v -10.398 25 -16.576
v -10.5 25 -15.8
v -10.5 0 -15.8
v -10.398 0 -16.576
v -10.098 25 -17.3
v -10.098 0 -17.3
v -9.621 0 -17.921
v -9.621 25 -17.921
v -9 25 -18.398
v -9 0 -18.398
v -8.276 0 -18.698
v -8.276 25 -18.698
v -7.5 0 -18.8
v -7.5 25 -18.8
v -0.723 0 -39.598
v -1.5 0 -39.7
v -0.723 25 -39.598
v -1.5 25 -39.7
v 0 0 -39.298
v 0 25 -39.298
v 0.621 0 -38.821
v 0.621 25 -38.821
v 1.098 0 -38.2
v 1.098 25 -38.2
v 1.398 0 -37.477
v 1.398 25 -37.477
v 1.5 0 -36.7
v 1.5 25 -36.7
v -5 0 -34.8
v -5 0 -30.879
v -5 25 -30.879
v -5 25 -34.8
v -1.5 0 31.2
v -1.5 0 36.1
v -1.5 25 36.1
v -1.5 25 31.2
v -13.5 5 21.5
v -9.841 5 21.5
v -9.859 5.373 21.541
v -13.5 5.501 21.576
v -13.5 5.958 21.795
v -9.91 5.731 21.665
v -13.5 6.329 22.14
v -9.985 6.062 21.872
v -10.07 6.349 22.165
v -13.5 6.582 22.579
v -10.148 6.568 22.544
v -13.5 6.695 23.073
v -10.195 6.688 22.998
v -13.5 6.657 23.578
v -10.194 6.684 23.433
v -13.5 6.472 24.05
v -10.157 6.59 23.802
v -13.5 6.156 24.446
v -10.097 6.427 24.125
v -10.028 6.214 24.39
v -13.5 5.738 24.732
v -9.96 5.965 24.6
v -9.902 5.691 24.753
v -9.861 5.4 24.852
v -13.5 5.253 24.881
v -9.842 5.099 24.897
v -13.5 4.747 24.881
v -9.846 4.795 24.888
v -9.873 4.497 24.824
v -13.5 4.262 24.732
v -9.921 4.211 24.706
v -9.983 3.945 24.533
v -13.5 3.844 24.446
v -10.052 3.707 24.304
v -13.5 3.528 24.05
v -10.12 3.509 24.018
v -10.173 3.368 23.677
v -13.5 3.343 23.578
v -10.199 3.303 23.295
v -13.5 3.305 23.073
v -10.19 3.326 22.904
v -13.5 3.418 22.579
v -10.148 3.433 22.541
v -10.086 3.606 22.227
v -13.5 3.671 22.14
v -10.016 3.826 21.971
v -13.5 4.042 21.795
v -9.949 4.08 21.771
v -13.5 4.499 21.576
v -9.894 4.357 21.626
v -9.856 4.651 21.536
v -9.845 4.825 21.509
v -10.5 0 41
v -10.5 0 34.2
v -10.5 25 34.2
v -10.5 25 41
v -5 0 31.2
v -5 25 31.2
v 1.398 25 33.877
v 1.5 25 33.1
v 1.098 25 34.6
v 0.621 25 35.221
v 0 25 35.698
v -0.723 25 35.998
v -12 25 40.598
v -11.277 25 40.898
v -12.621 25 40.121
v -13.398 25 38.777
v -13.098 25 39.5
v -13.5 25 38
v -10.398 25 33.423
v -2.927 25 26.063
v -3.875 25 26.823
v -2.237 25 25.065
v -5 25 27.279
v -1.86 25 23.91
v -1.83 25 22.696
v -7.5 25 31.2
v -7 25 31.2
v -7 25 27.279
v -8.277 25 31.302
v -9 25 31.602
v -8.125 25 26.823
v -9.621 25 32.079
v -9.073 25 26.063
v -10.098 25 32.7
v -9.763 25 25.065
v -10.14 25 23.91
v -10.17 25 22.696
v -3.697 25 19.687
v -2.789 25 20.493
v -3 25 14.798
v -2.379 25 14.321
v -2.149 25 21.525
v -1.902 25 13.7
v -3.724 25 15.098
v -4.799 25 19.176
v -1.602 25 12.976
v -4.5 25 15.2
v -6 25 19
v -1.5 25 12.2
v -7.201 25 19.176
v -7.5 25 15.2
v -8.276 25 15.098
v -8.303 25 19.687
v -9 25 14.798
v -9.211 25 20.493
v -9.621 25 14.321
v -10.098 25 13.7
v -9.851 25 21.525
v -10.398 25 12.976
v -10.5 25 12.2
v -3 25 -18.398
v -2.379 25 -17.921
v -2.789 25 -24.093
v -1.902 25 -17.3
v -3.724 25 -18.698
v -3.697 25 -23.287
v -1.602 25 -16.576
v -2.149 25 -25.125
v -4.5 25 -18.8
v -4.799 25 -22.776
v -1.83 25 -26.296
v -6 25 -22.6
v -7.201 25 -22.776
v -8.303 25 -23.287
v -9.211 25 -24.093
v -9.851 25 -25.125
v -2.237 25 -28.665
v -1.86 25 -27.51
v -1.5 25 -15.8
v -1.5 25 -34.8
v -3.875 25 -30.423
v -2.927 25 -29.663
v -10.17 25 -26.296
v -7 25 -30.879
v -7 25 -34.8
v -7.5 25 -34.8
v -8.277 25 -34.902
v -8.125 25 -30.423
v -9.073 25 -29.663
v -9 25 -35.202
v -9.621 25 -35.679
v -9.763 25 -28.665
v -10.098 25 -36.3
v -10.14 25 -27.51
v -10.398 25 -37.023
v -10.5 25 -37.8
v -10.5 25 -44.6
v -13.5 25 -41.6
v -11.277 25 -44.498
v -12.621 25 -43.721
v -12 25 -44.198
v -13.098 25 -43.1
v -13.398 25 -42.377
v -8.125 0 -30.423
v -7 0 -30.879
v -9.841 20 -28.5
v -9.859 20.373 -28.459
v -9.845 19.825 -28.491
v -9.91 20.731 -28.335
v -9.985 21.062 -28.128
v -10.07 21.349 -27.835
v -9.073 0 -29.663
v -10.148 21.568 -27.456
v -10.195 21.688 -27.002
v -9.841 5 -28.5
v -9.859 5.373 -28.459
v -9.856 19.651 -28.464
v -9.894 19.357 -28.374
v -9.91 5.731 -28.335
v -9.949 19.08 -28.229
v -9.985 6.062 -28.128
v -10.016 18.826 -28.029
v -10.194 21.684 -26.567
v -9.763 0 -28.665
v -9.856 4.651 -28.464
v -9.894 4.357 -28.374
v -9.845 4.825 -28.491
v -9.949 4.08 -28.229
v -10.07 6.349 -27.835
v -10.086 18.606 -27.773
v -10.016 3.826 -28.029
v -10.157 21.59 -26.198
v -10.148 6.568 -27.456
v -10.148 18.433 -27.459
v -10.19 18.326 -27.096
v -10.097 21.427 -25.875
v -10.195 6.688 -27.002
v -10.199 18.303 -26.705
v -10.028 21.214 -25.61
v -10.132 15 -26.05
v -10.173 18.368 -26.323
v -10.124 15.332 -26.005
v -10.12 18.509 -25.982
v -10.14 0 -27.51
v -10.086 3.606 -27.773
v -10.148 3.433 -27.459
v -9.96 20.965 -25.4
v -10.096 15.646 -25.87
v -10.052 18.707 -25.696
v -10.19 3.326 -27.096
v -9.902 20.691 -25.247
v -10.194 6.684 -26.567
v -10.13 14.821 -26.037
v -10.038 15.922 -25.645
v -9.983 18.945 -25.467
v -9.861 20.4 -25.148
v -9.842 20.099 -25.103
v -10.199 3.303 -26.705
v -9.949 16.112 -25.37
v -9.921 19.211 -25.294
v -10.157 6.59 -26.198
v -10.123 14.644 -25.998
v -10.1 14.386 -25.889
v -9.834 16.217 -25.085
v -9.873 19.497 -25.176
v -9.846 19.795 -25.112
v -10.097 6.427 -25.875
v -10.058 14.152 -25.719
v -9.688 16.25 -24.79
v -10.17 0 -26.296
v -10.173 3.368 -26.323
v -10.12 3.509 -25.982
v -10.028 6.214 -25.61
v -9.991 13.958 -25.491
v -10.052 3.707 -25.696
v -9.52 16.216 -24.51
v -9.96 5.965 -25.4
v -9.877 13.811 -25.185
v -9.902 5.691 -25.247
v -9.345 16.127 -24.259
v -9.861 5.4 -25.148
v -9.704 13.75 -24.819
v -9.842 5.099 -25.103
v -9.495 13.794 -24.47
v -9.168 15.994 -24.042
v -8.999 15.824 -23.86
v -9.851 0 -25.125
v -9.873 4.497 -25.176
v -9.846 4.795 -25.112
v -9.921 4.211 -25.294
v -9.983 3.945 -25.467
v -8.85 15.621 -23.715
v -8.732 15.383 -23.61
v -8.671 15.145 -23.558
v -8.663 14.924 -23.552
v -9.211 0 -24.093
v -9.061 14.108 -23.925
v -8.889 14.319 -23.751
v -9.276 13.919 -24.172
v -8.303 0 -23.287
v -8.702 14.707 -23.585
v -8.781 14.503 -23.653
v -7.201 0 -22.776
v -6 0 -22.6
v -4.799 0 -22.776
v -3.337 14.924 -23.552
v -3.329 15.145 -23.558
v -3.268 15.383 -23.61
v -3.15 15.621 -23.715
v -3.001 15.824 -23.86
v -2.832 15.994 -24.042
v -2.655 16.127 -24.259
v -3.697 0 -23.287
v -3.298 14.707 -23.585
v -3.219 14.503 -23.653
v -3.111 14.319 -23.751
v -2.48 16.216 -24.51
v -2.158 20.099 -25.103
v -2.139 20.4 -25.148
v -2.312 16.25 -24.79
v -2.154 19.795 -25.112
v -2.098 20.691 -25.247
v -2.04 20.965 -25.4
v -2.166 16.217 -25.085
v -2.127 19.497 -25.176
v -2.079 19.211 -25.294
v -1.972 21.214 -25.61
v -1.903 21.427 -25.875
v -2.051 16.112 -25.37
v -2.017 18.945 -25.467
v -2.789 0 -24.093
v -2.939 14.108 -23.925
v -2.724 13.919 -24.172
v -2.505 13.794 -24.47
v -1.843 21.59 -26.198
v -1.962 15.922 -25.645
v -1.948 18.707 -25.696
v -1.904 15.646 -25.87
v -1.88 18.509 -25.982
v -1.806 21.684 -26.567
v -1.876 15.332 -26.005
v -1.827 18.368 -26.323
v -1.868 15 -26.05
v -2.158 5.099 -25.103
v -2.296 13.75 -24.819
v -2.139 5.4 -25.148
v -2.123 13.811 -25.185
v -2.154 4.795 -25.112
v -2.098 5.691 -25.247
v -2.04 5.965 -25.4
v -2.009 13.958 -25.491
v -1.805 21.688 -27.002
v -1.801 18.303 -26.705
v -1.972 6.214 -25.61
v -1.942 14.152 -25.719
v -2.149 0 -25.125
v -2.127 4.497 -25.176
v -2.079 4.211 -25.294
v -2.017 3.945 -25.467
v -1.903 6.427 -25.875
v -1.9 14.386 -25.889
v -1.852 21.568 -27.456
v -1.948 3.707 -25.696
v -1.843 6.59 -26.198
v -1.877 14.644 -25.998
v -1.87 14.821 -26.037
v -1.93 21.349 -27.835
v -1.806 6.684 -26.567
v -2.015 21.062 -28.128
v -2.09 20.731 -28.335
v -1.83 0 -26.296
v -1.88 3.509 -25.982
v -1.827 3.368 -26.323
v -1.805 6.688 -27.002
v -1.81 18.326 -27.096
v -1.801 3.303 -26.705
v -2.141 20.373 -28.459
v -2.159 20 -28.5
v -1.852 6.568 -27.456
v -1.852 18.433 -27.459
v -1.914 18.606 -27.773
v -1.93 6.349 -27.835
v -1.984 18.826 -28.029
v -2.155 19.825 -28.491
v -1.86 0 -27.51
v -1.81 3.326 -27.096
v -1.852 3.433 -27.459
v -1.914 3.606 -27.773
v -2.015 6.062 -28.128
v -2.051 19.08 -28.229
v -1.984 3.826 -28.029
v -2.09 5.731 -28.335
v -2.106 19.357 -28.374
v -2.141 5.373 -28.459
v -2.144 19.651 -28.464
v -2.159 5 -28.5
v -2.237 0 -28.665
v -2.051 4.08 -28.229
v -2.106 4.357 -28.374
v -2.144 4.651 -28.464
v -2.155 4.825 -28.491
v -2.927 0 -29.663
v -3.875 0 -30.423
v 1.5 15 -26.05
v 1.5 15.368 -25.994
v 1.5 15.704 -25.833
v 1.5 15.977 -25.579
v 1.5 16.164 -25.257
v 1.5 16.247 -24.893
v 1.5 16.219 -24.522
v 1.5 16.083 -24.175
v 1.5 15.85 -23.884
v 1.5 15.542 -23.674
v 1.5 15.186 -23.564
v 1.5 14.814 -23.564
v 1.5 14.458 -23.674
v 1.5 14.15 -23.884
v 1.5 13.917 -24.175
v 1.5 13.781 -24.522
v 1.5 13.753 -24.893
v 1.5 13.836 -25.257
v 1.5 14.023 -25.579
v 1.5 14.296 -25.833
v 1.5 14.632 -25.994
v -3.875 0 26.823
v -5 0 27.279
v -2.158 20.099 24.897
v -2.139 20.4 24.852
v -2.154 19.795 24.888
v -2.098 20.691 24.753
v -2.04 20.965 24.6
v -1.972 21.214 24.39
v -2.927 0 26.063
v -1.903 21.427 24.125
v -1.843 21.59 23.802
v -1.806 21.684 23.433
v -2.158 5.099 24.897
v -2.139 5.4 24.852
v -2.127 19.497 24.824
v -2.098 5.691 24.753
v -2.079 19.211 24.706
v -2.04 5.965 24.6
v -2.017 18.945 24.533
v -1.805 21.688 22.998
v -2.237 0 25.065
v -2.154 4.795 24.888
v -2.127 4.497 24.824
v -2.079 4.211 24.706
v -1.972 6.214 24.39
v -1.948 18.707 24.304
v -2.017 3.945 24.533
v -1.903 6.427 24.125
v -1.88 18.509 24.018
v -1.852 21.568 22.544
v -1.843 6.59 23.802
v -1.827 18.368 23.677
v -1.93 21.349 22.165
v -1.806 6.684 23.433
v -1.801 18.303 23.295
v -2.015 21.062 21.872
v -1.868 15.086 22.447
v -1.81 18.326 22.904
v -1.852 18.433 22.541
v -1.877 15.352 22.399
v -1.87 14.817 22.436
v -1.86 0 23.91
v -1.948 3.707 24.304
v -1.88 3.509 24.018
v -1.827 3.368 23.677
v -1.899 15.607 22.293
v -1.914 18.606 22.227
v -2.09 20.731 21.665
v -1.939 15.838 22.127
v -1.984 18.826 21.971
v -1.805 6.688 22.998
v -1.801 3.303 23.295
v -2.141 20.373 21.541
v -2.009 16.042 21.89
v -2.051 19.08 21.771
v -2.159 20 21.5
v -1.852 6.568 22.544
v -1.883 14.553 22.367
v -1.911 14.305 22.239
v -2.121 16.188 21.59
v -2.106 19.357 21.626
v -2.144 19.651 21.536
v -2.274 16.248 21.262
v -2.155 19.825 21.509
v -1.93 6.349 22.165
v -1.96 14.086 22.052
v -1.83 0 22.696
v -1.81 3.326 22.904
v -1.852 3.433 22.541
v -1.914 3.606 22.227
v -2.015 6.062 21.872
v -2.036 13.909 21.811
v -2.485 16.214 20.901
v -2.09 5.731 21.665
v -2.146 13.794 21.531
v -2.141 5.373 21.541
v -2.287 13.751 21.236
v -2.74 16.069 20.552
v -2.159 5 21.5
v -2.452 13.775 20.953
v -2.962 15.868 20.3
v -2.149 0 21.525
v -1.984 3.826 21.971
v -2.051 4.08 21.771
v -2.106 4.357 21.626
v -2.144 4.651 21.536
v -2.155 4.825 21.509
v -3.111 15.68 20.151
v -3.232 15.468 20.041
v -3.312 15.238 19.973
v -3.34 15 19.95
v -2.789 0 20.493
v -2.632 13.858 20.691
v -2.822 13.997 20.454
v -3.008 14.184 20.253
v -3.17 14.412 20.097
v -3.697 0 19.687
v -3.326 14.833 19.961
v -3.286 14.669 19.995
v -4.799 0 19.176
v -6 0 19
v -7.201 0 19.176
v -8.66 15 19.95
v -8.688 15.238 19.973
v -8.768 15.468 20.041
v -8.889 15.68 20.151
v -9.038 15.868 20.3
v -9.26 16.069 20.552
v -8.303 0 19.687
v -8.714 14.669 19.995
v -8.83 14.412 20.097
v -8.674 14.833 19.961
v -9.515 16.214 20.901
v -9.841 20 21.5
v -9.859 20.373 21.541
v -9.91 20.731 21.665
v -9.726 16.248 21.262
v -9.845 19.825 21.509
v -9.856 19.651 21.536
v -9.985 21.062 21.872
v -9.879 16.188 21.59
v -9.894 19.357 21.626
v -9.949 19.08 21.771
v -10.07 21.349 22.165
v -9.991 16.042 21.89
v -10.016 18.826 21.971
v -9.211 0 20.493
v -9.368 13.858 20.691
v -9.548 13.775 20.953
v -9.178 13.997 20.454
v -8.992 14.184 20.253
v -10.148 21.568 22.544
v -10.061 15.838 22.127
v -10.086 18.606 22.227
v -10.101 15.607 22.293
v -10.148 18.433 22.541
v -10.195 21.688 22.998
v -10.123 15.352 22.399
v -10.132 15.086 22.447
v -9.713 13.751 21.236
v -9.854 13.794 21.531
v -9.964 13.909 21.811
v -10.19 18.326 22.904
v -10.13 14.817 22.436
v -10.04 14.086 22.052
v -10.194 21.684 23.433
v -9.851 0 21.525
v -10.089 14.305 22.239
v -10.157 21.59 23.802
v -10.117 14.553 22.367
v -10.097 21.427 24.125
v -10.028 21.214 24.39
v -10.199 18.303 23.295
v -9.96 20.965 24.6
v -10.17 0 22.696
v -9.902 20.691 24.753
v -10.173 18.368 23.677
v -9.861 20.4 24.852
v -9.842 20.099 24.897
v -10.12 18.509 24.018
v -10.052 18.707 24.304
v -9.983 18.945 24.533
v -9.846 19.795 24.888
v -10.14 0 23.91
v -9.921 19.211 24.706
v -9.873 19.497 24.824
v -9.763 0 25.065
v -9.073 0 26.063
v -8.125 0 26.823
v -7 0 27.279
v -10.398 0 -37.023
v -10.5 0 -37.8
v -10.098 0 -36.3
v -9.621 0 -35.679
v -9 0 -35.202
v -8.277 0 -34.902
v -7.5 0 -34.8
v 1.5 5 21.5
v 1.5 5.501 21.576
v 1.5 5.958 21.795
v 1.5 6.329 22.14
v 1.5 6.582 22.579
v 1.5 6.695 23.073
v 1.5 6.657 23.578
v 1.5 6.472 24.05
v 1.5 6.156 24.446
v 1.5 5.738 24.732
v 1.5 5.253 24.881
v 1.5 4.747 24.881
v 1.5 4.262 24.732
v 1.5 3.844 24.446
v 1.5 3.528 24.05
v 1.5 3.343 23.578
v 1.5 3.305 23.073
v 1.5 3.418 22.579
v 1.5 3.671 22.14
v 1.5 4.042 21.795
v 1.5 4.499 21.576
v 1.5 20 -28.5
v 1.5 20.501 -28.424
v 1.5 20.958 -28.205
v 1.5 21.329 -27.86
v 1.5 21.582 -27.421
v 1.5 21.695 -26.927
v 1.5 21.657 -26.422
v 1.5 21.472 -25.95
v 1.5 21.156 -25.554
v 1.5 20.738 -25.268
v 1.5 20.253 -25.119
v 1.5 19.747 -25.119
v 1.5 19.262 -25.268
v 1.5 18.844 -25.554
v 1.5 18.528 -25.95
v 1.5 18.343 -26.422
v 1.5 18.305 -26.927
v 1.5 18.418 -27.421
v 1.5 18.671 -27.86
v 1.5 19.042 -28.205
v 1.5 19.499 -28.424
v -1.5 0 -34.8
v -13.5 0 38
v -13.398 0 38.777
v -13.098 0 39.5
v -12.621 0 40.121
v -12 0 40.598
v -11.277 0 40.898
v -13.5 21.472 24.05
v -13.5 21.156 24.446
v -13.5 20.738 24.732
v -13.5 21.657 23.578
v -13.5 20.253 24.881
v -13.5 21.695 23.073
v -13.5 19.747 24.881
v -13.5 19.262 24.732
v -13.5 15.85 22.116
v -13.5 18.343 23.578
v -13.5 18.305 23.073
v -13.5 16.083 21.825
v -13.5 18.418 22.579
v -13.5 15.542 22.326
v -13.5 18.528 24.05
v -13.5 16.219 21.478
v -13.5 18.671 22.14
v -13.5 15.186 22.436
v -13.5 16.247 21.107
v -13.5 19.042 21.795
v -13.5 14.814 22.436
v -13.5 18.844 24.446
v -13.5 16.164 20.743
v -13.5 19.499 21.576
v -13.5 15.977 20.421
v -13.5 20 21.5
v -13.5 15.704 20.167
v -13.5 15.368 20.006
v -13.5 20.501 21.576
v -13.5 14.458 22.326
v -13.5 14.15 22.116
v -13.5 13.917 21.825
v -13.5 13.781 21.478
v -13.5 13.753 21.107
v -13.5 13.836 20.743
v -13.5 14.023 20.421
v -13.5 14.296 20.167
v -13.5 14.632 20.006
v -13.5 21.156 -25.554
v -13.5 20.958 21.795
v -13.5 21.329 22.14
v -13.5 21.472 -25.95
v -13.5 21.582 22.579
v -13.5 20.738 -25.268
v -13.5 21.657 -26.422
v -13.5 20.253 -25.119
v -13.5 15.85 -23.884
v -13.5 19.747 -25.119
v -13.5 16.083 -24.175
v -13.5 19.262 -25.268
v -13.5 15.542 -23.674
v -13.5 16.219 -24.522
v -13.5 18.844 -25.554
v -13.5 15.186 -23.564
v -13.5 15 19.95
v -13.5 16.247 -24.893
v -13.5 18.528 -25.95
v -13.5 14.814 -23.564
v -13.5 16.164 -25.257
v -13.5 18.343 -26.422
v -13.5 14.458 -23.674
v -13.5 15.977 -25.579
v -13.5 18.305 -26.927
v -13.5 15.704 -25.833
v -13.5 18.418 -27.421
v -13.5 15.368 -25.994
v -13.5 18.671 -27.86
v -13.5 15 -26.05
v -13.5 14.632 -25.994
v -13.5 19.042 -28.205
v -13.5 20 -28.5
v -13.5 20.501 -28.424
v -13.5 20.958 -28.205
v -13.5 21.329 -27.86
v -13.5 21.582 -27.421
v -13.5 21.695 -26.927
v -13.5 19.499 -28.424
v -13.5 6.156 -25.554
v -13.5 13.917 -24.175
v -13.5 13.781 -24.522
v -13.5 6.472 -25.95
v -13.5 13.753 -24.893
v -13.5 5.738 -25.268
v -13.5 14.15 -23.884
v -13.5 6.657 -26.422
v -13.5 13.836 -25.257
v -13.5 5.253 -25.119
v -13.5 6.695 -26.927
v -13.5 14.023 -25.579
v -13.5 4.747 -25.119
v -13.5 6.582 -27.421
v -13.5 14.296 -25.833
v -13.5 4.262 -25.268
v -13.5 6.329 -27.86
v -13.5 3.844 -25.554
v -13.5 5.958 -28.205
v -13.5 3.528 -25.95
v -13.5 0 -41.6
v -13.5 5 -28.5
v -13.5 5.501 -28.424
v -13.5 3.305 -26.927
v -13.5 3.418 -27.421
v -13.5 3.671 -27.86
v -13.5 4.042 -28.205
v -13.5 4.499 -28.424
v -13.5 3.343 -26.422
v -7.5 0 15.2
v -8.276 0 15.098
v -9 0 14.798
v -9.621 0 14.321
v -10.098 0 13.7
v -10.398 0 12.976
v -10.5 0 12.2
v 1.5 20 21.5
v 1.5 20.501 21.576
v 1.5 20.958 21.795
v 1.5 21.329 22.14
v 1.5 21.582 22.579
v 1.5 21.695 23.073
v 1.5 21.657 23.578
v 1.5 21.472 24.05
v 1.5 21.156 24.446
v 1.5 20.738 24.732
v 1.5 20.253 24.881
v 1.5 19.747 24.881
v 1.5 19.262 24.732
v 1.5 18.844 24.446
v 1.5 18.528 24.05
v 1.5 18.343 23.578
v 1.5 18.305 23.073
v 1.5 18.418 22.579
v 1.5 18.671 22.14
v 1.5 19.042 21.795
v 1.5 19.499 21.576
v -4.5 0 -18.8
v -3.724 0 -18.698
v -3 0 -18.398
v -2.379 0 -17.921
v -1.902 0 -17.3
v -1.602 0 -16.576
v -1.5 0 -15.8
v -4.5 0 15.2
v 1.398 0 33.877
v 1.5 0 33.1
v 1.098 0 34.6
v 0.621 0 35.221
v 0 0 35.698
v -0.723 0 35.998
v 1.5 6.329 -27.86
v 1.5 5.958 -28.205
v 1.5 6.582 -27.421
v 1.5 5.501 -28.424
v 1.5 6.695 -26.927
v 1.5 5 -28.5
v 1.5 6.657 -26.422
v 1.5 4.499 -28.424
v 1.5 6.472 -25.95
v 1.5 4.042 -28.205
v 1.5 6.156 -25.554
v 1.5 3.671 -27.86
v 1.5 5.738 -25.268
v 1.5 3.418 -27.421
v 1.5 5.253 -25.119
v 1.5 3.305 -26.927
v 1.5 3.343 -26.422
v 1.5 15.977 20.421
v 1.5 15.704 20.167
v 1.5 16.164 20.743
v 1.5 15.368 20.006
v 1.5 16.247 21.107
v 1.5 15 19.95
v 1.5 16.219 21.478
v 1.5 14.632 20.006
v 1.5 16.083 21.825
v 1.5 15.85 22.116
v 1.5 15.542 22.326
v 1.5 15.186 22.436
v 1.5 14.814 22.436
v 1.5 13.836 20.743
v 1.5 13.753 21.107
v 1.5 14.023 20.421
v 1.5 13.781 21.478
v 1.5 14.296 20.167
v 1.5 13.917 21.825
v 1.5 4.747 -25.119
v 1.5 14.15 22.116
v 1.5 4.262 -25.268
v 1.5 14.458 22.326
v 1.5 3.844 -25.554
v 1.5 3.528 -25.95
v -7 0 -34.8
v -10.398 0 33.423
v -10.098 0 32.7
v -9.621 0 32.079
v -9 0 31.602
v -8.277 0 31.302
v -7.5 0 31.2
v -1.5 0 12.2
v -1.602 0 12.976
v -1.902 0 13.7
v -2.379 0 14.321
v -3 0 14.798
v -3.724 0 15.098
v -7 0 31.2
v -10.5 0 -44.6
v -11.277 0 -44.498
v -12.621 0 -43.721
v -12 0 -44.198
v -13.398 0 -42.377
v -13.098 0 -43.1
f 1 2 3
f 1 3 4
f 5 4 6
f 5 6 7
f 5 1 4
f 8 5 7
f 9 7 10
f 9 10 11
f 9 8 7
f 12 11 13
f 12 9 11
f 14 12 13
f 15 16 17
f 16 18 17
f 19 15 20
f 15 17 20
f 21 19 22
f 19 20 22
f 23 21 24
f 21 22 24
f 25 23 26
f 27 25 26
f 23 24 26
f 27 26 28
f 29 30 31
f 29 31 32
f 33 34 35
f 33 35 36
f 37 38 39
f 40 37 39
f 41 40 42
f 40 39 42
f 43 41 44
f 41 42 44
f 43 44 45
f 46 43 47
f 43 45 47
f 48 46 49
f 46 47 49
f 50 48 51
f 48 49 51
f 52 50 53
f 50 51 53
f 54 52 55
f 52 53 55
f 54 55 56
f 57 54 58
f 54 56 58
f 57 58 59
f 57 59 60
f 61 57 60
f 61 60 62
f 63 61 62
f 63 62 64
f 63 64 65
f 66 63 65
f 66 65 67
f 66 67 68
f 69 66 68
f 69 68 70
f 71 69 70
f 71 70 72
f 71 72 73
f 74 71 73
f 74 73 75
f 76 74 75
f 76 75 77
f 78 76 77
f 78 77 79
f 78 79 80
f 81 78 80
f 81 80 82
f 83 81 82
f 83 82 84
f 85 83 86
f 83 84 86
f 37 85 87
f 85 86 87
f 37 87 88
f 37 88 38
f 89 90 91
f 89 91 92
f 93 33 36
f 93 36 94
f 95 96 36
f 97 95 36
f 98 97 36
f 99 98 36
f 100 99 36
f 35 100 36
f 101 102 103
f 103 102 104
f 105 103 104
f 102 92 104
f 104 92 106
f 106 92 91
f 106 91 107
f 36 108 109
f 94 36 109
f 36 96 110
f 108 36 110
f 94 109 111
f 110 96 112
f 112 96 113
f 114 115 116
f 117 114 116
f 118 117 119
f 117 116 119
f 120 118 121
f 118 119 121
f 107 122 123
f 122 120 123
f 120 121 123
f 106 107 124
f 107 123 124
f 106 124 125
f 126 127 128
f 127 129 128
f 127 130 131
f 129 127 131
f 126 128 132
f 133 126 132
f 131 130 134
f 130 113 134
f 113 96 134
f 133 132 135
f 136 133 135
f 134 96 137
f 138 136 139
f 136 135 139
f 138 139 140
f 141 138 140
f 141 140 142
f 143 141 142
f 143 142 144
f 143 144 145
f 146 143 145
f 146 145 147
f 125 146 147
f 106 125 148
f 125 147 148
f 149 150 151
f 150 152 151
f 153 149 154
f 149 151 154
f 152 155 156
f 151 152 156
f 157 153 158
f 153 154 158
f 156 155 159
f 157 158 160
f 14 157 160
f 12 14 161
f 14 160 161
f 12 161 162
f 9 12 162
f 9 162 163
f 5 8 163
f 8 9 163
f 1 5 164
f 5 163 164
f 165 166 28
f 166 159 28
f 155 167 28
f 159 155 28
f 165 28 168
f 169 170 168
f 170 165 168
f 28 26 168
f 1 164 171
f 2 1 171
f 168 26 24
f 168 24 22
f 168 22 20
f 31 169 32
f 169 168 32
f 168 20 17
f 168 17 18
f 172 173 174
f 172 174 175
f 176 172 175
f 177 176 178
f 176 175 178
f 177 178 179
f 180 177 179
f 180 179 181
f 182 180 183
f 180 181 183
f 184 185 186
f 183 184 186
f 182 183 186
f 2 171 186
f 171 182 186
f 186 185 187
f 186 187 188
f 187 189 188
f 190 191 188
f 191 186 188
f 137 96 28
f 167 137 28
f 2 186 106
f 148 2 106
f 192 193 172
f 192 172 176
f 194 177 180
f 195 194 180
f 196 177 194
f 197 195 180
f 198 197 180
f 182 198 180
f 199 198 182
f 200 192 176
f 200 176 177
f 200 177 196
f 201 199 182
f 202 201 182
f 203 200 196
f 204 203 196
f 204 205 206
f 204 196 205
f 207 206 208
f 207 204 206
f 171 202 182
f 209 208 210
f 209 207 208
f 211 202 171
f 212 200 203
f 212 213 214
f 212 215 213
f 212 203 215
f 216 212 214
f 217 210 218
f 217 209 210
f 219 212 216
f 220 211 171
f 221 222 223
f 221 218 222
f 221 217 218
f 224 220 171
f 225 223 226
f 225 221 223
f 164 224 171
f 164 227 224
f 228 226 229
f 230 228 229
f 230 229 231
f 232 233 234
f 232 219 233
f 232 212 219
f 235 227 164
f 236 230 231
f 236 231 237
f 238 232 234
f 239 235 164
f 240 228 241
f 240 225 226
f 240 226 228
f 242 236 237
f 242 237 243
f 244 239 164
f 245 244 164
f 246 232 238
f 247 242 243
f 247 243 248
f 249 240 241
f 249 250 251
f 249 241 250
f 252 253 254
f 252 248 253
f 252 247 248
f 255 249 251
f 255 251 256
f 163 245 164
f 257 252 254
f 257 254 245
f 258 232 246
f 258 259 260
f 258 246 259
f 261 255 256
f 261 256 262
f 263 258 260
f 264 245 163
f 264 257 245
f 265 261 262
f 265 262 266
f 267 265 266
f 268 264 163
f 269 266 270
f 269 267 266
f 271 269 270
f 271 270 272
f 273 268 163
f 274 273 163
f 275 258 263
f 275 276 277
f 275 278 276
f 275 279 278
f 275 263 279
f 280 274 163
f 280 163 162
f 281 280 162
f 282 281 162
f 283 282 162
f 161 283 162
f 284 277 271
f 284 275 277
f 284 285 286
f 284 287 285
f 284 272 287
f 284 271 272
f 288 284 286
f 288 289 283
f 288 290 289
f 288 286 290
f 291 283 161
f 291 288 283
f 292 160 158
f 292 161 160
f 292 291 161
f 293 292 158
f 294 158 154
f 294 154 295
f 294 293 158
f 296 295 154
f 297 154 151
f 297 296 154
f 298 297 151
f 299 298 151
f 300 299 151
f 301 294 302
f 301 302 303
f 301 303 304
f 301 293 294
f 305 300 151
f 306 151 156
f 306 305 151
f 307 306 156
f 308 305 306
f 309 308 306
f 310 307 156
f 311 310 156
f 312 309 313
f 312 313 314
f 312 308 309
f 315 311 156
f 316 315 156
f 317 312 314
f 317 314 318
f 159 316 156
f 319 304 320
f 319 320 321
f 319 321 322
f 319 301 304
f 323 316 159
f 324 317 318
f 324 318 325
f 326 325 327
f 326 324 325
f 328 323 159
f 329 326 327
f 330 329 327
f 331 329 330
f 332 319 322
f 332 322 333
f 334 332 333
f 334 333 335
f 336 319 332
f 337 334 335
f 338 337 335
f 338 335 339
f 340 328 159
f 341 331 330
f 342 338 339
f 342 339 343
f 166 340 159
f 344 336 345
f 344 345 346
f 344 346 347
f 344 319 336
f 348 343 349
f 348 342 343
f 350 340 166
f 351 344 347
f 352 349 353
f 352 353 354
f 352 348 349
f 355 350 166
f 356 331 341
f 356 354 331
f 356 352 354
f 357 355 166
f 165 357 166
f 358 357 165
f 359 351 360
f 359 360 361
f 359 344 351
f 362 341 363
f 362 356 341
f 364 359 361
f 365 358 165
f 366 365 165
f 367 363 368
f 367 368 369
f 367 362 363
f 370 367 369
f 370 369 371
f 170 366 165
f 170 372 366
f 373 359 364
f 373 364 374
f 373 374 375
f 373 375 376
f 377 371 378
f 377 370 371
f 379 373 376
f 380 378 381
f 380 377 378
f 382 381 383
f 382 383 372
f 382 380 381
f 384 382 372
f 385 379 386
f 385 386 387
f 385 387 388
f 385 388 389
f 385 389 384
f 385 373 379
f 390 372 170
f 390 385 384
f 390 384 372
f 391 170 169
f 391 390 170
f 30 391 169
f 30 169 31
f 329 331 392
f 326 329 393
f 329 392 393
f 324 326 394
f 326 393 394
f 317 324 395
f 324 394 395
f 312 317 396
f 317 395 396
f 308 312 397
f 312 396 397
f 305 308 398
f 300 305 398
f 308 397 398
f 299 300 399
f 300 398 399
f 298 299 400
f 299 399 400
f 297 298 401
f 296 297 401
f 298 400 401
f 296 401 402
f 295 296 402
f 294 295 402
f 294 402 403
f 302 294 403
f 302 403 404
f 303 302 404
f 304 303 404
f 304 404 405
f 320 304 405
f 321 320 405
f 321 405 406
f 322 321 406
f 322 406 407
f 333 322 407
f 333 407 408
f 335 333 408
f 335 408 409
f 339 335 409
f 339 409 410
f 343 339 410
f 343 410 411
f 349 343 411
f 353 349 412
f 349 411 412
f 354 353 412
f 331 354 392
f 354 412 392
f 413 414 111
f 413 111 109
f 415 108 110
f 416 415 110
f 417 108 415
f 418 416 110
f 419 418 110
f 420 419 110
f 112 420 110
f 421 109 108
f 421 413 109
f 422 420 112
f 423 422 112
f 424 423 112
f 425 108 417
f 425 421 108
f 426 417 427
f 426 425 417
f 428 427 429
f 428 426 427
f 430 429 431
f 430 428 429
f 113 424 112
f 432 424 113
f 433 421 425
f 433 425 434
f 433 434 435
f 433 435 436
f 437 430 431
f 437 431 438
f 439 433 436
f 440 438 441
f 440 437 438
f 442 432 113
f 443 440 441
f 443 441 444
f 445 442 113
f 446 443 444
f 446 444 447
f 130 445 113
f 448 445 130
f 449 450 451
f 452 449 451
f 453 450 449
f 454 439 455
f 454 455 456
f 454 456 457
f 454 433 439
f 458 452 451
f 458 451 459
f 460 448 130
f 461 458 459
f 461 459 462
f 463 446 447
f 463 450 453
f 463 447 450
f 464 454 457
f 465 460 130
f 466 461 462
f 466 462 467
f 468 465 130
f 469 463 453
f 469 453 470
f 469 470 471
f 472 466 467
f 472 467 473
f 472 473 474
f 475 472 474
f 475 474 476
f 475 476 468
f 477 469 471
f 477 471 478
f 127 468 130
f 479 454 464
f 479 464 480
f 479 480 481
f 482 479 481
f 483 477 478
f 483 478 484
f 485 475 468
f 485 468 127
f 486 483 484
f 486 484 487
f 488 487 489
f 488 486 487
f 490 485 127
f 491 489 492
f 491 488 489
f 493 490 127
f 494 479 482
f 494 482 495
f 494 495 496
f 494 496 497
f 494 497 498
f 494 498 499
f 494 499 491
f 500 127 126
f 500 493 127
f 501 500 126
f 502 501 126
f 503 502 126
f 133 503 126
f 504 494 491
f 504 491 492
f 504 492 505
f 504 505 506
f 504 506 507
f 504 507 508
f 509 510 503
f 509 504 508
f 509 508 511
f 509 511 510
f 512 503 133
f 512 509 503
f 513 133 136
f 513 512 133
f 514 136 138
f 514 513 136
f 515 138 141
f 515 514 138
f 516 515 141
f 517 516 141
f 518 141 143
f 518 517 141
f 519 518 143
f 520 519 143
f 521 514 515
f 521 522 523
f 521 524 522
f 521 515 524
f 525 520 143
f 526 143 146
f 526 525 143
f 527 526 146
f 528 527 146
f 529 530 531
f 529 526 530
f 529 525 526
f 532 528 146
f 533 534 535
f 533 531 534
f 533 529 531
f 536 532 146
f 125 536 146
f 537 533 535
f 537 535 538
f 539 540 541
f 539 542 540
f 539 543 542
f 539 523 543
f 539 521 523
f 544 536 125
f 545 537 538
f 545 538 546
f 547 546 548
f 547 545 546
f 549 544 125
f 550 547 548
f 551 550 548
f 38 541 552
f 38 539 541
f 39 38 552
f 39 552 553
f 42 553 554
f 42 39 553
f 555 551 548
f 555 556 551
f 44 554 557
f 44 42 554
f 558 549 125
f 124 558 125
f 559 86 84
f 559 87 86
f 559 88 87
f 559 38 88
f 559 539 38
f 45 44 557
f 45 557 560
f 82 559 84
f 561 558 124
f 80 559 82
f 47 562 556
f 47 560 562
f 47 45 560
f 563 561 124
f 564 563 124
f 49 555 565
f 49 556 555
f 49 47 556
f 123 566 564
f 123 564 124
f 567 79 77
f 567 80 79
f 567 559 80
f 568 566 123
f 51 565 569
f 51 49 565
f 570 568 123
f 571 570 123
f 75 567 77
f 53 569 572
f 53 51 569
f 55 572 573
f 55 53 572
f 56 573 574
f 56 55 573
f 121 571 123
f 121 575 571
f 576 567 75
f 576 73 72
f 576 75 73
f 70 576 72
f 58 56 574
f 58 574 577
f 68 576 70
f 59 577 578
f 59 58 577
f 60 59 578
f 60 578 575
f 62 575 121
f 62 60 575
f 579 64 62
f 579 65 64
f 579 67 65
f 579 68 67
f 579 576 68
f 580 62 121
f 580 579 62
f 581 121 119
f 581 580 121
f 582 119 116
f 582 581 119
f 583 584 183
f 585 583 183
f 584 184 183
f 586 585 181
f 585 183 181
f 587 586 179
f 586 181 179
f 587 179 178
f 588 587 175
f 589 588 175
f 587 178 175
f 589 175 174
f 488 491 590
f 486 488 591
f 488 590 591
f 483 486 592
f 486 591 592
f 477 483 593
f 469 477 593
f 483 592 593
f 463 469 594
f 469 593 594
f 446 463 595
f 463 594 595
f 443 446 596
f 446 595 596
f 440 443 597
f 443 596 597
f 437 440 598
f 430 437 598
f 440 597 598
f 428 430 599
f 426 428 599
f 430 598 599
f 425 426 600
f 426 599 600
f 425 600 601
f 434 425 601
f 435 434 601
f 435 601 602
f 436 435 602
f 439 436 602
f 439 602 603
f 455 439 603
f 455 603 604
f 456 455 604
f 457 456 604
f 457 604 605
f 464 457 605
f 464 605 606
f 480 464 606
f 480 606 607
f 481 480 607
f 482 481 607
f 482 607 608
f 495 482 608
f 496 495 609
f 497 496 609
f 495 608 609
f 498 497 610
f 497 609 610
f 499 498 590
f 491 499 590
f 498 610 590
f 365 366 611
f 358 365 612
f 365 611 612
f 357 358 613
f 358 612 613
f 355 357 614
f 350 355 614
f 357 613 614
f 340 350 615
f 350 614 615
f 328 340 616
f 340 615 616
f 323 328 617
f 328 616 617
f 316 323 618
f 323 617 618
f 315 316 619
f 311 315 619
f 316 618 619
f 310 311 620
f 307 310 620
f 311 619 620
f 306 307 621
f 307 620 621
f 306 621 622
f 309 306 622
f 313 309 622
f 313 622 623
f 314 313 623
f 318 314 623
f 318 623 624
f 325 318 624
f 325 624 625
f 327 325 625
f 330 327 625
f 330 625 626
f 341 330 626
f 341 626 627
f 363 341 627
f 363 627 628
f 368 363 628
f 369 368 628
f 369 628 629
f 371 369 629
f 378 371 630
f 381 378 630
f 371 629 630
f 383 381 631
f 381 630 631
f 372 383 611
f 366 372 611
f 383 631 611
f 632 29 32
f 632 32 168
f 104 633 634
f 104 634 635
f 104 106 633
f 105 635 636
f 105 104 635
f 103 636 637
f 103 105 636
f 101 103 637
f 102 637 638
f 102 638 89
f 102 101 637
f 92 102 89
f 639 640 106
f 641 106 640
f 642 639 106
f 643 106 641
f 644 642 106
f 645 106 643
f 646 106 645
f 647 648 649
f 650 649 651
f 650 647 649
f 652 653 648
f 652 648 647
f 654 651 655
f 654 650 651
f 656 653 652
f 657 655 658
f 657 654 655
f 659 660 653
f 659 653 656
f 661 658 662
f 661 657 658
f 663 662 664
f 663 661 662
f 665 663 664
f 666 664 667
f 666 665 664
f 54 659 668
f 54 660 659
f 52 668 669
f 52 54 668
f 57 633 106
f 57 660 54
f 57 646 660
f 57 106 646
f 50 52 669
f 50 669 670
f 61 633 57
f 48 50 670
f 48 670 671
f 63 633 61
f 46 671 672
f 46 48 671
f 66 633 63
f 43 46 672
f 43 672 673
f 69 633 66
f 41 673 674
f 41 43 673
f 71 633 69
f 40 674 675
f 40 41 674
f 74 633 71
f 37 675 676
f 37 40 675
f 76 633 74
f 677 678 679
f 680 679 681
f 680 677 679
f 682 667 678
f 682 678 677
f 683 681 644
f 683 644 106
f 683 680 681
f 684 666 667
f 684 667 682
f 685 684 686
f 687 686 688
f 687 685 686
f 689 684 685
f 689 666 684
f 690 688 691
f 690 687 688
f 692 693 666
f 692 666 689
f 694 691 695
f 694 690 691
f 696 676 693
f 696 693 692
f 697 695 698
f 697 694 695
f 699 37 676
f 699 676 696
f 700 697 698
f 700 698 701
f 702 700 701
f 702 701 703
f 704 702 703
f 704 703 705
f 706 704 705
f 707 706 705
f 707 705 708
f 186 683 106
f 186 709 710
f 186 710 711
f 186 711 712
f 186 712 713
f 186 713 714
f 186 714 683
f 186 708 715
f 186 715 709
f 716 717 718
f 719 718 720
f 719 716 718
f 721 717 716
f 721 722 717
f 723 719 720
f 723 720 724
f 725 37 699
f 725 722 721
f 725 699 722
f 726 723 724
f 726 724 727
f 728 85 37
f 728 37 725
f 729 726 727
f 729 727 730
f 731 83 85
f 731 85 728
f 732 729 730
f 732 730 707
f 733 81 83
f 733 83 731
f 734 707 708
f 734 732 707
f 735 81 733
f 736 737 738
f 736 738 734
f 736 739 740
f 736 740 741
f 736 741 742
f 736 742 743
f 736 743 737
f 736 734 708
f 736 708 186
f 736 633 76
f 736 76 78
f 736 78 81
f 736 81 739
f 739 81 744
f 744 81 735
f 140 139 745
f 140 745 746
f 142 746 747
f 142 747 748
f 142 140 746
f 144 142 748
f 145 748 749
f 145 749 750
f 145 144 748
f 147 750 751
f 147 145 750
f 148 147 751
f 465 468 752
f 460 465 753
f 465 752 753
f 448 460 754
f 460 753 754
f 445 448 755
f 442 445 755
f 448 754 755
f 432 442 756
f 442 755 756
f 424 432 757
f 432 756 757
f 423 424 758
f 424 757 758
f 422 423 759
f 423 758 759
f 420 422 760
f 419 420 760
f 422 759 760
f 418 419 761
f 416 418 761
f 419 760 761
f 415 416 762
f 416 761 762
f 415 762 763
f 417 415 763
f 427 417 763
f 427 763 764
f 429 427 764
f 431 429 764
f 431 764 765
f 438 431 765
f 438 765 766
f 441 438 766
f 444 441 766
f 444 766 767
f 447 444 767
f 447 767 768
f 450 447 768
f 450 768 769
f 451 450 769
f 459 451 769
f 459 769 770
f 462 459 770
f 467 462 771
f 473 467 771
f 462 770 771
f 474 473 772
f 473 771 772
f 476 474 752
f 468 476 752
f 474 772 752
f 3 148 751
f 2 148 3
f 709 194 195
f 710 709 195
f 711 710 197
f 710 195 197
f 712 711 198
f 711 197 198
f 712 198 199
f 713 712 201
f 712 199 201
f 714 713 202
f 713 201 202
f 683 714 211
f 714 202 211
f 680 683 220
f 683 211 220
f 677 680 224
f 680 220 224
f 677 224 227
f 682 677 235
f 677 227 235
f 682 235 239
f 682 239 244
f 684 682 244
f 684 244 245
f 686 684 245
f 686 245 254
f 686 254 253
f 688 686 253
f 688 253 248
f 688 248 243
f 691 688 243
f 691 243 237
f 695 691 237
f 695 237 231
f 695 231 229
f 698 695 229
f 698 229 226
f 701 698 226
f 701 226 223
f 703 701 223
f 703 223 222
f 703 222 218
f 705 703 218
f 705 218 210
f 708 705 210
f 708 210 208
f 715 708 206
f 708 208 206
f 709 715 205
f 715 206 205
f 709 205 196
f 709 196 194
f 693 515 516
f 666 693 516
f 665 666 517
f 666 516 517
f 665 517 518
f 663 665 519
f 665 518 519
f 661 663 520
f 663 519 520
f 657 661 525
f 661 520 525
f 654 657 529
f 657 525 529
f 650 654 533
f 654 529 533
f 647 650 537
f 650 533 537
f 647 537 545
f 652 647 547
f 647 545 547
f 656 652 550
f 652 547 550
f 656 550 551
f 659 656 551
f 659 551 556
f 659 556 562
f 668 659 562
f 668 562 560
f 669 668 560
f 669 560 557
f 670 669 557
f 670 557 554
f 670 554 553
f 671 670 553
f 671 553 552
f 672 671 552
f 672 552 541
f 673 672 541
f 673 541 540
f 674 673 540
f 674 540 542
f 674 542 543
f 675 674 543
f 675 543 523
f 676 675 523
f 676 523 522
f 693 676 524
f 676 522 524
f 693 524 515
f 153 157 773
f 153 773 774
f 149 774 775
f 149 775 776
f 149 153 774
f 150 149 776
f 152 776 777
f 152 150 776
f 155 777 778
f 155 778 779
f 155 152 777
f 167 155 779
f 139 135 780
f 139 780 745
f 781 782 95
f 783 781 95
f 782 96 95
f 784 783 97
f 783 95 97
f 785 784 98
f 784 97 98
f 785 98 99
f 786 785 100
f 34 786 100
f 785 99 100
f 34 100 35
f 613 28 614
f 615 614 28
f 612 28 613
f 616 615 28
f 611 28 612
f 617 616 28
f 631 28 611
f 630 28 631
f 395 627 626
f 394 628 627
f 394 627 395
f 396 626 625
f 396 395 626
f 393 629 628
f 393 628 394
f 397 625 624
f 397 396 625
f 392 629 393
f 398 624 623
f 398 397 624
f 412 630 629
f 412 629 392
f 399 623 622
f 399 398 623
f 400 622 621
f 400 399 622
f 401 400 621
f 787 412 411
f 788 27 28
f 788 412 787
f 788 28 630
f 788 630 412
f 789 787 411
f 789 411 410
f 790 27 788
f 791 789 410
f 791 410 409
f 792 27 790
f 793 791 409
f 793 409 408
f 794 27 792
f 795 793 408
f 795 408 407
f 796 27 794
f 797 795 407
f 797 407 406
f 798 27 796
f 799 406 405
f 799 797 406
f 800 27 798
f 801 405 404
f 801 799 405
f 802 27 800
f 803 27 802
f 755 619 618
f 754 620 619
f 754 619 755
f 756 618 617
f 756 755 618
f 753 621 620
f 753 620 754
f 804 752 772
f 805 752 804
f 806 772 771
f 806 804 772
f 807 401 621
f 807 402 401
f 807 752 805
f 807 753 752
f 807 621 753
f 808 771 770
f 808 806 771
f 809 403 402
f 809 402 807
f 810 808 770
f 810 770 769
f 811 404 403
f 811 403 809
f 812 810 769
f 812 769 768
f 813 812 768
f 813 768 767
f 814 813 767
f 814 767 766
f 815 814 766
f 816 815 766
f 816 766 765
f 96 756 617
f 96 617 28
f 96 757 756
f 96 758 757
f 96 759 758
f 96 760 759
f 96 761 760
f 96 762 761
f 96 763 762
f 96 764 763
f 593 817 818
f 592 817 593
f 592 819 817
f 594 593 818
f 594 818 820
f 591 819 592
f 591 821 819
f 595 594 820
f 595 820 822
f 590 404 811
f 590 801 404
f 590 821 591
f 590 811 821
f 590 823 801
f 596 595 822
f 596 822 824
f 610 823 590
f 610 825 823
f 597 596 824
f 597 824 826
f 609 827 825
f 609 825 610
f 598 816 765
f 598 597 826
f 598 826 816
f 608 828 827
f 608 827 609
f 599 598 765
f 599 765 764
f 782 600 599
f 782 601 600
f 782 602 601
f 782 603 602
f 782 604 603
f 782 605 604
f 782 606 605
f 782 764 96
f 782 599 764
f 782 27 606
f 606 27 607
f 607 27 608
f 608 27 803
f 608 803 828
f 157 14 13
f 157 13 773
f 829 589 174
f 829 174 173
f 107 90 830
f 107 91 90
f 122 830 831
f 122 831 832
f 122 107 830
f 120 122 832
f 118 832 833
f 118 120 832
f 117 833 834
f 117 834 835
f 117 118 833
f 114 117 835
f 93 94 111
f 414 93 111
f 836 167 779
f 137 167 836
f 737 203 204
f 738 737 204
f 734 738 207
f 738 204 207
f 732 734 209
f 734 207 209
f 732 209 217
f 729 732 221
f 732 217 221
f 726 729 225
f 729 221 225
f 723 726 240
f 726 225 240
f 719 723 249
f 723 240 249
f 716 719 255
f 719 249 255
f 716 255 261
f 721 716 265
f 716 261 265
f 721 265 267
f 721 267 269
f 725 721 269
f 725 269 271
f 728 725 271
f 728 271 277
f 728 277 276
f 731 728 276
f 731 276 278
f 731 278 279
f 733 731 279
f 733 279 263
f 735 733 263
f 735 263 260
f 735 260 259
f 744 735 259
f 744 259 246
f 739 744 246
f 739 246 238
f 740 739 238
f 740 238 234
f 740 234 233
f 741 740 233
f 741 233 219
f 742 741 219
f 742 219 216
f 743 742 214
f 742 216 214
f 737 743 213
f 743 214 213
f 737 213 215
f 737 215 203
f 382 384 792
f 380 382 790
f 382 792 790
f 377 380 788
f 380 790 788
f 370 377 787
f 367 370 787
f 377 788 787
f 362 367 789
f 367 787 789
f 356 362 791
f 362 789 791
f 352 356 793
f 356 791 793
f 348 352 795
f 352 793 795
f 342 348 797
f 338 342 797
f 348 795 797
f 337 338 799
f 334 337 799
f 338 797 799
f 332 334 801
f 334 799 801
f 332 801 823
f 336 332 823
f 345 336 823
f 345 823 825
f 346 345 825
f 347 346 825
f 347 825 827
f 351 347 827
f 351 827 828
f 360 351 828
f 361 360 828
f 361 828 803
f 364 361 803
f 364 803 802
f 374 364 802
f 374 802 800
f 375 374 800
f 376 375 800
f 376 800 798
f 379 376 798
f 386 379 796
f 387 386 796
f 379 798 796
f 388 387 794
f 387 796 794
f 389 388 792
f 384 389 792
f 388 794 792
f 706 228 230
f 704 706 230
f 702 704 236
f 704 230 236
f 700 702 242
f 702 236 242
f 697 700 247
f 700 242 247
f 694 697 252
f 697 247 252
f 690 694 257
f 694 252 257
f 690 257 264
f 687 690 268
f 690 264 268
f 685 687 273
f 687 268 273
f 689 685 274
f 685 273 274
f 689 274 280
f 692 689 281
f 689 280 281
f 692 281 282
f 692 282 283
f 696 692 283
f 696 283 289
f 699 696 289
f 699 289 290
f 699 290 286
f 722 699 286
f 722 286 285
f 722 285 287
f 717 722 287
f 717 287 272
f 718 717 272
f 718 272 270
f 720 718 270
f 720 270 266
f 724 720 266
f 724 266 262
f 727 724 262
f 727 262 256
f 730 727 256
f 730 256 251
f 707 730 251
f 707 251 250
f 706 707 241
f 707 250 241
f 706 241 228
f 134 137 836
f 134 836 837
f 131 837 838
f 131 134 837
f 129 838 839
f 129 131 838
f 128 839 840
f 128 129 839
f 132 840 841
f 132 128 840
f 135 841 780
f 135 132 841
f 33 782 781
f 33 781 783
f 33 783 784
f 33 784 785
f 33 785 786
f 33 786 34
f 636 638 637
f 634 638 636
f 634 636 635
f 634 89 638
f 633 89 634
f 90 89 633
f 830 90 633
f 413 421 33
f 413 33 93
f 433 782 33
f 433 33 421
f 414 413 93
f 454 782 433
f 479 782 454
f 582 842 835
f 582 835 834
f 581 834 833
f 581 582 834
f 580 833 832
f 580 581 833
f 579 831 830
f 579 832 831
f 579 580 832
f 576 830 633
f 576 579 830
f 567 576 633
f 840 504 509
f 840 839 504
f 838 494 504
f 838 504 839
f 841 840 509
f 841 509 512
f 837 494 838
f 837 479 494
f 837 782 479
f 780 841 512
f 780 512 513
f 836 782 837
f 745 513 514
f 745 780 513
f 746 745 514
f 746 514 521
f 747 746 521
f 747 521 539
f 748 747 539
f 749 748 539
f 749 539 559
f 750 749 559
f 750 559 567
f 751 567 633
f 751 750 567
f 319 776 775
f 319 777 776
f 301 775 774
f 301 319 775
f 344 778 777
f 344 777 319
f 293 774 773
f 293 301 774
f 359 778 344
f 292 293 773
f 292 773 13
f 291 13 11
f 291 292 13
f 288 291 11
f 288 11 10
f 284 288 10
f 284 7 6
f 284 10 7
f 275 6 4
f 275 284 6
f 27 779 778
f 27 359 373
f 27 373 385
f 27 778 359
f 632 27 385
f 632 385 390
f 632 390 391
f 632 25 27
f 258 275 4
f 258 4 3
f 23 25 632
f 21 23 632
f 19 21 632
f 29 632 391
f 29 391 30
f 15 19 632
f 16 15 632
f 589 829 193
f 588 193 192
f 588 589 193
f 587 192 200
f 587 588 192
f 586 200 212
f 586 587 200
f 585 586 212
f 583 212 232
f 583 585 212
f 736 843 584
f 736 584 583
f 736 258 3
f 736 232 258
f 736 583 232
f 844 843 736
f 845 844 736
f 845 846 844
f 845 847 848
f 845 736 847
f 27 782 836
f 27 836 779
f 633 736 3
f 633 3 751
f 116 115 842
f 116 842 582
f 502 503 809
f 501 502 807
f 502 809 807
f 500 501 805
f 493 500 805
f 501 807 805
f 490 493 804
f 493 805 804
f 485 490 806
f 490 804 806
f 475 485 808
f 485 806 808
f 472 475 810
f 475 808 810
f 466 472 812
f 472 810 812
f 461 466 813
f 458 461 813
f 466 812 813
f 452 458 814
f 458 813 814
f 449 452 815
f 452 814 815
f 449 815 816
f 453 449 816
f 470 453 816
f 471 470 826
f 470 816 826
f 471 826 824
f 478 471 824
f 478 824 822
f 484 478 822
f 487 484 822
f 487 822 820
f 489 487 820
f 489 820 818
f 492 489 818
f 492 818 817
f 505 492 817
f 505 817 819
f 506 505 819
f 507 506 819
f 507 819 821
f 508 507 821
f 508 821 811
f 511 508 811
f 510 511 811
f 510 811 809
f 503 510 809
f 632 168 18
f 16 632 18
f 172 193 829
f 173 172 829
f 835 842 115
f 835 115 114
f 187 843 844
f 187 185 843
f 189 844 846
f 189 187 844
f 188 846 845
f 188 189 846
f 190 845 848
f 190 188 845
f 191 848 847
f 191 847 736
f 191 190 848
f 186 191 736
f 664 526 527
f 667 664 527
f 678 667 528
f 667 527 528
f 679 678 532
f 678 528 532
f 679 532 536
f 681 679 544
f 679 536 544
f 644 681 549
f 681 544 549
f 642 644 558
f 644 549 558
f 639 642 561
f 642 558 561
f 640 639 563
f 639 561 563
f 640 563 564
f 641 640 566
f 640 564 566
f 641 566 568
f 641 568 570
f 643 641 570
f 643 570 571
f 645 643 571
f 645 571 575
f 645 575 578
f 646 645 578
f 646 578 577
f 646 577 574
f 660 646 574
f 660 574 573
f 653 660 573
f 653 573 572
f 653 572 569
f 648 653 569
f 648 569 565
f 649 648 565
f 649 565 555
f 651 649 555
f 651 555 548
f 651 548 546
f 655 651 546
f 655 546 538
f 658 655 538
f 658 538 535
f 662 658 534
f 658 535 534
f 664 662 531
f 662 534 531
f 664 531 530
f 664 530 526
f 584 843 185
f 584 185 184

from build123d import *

# Parameters (mm, degrees)
SKETCH_2_R          = 4.2
EXTRUDE_1_DEPTH     = 25
FILLET_1_R          = 3
CUT_EXTRUDE_1_DEPTH = 25
SKETCH_4_W          = 2
SKETCH_4_H          = 9.772408651
SKETCH_4_H_2        = 10.02993421
CUT_EXTRUDE_2_DEPTH = 25
SKETCH_5_R          = 1.25
CUT_EXTRUDE_3_DEPTH = 35
SKETCH_6_R          = 1.7
CUT_EXTRUDE_4_DEPTH = 32


with BuildPart() as part:
    # 草图2 → 凸台-拉伸1 (new body)
    with BuildSketch(Plane(origin=(0, 0, 0), x_dir=(1, 0, 0), z_dir=(0, 1, 0))):
        Polygon((-10.5, 44.6), (-10.5, 34.8), (-1.5, 34.8), (-1.5, 39.7), (1.5, 39.7), (1.5, -36.1), (-1.5, -36.1), (-1.5, -31.2), (-10.5, -31.2), (-10.5, -41), (-13.5, -41), (-13.5, 44.6), align=None)
        with Locations(Location((-6, -23.2, 0), (0, 0, 270))):
            Circle(SKETCH_2_R, mode=Mode.SUBTRACT)
        with Locations(Location((-6, 26.8, 0), (0, 0, 270))):
            Circle(SKETCH_2_R, mode=Mode.SUBTRACT)
    extrude(amount=EXTRUDE_1_DEPTH)

    # 圆角1
    fillet_1_edges = [part.edges().sort_by_distance(p)[0] for p in [
        (1.5, 12.5, 36.1),
        (1.5, 12.5, -39.7),
        (-10.5, 12.5, -34.8),
        (-10.5, 12.5, 31.2),
        (-13.5, 12.5, -44.6),
        (-13.5, 12.5, 41),
    ]]
    fillet(fillet_1_edges, radius=FILLET_1_R - 0.0001)  # a hair under: the kernel refuses the full size

    # 草图3 → 切除-拉伸1 (cut)
    with BuildSketch(Plane(origin=(0, 25, 0), x_dir=(1, 0, 0), z_dir=(0, 1, 0))):
        with BuildLine():
            Line((-7.5, 18.8), (-4.5, 18.8))
            ThreePointArc((-4.5, 18.8), (-2.378679656, 17.921320344), (-1.5, 15.8))
            Line((-1.5, 15.8), (-1.5, -12.2))
            ThreePointArc((-1.5, -12.2), (-2.378679656, -14.321320344), (-4.5, -15.2))
            Line((-4.5, -15.2), (-7.5, -15.2))
            ThreePointArc((-7.5, -15.2), (-9.621320344, -14.321320344), (-10.5, -12.2))
            Line((-10.5, -12.2), (-10.5, 15.8))
            ThreePointArc((-10.5, 15.8), (-9.621320344, 17.921320344), (-7.5, 18.8))
        make_face()
    extrude(amount=-CUT_EXTRUDE_1_DEPTH, mode=Mode.SUBTRACT)

    # 草图4 → 切除-拉伸2 (cut)
    with BuildSketch(Plane(origin=(0, 25, 0), x_dir=(1, 0, 0), z_dir=(0, 1, 0))):
        with Locations((-6, -31.836216801)):
            Rectangle(SKETCH_4_W, SKETCH_4_H)
        with Locations((-6, 32.148208176)):
            Rectangle(SKETCH_4_W, SKETCH_4_H_2)
    extrude(amount=-CUT_EXTRUDE_2_DEPTH, mode=Mode.SUBTRACT)

    # 草图5 → 切除-拉伸3 (cut)
    with BuildSketch(Plane(origin=(1.5, 0, 0), x_dir=(0, 0, -1), z_dir=(1, 0, 0))):
        with Locations((-21.2, 15)):
            Circle(SKETCH_5_R)
        with Locations((24.8, 15)):
            Circle(SKETCH_5_R)
    extrude(amount=-CUT_EXTRUDE_3_DEPTH, mode=Mode.SUBTRACT)

    # 草图6 → 切除-拉伸4 (cut)
    with BuildSketch(Plane(origin=(1.5, 0, 0), x_dir=(0, 0, -1), z_dir=(1, 0, 0))):
        with Locations((26.8, 5)):
            Circle(SKETCH_6_R)
        with Locations((26.8, 20)):
            Circle(SKETCH_6_R)
        with Locations((-23.2, 5)):
            Circle(SKETCH_6_R)
        with Locations((-23.2, 20)):
            Circle(SKETCH_6_R)
    extrude(amount=-CUT_EXTRUDE_4_DEPTH, mode=Mode.SUBTRACT)


solid = part.part
